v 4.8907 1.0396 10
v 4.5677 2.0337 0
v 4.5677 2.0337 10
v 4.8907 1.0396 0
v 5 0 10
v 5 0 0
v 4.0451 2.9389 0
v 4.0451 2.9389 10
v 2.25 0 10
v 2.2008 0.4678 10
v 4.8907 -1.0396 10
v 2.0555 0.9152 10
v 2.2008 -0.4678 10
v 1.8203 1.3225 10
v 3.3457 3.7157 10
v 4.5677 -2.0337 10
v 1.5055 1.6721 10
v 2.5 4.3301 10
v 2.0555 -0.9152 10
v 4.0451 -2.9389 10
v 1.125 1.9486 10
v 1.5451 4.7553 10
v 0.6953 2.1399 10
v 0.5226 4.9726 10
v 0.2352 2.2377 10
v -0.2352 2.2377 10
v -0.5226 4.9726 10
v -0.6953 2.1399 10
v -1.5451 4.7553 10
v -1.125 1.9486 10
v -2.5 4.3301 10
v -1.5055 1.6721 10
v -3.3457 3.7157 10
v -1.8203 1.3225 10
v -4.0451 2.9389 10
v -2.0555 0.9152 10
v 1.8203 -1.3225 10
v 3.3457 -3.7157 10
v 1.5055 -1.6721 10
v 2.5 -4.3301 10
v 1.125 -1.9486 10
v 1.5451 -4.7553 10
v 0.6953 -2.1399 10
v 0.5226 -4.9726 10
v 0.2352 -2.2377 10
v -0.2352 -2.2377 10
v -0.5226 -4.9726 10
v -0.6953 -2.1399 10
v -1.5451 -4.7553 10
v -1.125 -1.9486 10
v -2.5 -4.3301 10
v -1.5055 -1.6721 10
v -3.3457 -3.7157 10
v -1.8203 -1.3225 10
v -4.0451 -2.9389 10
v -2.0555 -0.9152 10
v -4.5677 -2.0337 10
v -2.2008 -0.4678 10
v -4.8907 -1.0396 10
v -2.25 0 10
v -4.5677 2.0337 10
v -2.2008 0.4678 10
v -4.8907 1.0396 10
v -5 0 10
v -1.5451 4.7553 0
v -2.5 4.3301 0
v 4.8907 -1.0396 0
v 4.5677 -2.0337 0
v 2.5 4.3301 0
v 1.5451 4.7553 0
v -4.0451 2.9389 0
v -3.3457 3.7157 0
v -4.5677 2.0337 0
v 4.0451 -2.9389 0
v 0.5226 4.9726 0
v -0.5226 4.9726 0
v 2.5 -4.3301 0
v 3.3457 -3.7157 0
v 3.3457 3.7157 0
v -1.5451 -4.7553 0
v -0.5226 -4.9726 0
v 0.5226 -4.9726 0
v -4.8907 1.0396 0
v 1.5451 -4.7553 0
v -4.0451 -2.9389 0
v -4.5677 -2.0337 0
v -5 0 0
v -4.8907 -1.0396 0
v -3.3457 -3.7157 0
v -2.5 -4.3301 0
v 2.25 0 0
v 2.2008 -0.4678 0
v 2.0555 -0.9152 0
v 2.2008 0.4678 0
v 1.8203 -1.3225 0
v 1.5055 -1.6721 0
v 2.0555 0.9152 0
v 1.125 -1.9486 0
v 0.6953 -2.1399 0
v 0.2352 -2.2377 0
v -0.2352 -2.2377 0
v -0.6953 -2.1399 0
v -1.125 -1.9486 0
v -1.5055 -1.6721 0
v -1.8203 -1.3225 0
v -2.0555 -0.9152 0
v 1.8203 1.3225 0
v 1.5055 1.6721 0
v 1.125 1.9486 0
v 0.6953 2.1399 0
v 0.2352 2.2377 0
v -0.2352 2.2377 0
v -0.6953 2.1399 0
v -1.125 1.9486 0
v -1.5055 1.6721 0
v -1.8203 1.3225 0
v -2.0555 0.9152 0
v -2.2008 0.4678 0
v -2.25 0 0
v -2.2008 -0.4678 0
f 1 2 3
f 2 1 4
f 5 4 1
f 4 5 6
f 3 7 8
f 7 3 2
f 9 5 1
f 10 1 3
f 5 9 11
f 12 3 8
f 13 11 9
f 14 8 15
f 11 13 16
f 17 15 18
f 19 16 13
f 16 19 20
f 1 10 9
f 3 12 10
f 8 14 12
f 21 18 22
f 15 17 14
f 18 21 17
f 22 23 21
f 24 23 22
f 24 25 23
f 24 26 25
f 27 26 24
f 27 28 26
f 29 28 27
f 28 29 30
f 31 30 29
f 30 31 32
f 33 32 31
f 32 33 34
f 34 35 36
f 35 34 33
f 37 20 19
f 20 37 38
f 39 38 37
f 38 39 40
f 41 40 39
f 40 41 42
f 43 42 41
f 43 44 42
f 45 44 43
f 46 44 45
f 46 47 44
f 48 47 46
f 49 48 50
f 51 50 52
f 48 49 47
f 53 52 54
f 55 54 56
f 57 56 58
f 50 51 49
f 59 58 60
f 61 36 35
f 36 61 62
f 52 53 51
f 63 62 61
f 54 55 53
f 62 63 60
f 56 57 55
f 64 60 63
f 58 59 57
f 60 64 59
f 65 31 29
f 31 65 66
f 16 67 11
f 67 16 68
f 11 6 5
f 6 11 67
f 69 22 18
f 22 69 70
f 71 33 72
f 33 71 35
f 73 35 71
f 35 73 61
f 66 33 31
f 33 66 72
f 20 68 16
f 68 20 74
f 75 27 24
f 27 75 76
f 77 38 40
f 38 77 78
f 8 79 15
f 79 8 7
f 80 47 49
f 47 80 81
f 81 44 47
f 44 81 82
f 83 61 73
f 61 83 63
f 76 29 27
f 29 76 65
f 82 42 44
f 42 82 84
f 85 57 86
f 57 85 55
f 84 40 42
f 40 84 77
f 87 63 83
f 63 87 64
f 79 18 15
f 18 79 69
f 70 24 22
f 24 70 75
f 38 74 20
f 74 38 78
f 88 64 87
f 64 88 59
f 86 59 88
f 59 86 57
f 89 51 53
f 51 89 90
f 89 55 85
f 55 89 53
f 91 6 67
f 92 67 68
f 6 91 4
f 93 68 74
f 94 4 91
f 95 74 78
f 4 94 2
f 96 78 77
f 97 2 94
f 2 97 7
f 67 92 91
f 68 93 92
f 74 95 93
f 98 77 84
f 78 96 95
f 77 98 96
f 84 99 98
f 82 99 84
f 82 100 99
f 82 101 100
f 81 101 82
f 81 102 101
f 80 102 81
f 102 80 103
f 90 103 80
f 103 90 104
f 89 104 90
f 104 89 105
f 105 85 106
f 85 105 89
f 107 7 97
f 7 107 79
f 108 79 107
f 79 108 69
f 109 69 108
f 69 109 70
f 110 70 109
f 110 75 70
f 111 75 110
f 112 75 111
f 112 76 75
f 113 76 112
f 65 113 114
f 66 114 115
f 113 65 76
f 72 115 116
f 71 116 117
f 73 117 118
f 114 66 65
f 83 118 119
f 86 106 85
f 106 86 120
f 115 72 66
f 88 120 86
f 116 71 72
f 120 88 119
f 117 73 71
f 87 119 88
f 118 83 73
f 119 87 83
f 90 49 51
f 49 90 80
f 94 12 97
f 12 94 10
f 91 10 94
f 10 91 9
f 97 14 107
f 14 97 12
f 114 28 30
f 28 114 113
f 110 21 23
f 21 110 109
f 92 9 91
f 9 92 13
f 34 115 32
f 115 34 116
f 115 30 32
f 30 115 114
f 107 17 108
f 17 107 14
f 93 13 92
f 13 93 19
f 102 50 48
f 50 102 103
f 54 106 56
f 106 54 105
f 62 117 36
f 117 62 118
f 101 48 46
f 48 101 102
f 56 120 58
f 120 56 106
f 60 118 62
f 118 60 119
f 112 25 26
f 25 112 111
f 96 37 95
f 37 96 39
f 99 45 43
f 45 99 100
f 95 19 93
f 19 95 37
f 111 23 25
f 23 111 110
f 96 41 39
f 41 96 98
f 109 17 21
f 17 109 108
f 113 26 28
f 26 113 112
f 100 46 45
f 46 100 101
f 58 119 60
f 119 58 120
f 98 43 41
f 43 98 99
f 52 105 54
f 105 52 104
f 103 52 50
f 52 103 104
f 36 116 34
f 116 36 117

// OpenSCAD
// parametric round plain washer

outside_diameter = 10.0;
inside_diameter = 4.5;
height = 10.0;

module washer() {
	translate([0,0,height/2]) {
		difference() {
			cylinder(h=height, r1=outside_diameter/2, r2=outside_diameter/2, center=true, $fn=outside_diameter*3);
			translate([0,0,-2])
				cylinder(h=height+5, r1=inside_diameter/2, r2=inside_diameter/2, center=true, $fn=outside_diameter*3);
		}
	}
}

washer();
